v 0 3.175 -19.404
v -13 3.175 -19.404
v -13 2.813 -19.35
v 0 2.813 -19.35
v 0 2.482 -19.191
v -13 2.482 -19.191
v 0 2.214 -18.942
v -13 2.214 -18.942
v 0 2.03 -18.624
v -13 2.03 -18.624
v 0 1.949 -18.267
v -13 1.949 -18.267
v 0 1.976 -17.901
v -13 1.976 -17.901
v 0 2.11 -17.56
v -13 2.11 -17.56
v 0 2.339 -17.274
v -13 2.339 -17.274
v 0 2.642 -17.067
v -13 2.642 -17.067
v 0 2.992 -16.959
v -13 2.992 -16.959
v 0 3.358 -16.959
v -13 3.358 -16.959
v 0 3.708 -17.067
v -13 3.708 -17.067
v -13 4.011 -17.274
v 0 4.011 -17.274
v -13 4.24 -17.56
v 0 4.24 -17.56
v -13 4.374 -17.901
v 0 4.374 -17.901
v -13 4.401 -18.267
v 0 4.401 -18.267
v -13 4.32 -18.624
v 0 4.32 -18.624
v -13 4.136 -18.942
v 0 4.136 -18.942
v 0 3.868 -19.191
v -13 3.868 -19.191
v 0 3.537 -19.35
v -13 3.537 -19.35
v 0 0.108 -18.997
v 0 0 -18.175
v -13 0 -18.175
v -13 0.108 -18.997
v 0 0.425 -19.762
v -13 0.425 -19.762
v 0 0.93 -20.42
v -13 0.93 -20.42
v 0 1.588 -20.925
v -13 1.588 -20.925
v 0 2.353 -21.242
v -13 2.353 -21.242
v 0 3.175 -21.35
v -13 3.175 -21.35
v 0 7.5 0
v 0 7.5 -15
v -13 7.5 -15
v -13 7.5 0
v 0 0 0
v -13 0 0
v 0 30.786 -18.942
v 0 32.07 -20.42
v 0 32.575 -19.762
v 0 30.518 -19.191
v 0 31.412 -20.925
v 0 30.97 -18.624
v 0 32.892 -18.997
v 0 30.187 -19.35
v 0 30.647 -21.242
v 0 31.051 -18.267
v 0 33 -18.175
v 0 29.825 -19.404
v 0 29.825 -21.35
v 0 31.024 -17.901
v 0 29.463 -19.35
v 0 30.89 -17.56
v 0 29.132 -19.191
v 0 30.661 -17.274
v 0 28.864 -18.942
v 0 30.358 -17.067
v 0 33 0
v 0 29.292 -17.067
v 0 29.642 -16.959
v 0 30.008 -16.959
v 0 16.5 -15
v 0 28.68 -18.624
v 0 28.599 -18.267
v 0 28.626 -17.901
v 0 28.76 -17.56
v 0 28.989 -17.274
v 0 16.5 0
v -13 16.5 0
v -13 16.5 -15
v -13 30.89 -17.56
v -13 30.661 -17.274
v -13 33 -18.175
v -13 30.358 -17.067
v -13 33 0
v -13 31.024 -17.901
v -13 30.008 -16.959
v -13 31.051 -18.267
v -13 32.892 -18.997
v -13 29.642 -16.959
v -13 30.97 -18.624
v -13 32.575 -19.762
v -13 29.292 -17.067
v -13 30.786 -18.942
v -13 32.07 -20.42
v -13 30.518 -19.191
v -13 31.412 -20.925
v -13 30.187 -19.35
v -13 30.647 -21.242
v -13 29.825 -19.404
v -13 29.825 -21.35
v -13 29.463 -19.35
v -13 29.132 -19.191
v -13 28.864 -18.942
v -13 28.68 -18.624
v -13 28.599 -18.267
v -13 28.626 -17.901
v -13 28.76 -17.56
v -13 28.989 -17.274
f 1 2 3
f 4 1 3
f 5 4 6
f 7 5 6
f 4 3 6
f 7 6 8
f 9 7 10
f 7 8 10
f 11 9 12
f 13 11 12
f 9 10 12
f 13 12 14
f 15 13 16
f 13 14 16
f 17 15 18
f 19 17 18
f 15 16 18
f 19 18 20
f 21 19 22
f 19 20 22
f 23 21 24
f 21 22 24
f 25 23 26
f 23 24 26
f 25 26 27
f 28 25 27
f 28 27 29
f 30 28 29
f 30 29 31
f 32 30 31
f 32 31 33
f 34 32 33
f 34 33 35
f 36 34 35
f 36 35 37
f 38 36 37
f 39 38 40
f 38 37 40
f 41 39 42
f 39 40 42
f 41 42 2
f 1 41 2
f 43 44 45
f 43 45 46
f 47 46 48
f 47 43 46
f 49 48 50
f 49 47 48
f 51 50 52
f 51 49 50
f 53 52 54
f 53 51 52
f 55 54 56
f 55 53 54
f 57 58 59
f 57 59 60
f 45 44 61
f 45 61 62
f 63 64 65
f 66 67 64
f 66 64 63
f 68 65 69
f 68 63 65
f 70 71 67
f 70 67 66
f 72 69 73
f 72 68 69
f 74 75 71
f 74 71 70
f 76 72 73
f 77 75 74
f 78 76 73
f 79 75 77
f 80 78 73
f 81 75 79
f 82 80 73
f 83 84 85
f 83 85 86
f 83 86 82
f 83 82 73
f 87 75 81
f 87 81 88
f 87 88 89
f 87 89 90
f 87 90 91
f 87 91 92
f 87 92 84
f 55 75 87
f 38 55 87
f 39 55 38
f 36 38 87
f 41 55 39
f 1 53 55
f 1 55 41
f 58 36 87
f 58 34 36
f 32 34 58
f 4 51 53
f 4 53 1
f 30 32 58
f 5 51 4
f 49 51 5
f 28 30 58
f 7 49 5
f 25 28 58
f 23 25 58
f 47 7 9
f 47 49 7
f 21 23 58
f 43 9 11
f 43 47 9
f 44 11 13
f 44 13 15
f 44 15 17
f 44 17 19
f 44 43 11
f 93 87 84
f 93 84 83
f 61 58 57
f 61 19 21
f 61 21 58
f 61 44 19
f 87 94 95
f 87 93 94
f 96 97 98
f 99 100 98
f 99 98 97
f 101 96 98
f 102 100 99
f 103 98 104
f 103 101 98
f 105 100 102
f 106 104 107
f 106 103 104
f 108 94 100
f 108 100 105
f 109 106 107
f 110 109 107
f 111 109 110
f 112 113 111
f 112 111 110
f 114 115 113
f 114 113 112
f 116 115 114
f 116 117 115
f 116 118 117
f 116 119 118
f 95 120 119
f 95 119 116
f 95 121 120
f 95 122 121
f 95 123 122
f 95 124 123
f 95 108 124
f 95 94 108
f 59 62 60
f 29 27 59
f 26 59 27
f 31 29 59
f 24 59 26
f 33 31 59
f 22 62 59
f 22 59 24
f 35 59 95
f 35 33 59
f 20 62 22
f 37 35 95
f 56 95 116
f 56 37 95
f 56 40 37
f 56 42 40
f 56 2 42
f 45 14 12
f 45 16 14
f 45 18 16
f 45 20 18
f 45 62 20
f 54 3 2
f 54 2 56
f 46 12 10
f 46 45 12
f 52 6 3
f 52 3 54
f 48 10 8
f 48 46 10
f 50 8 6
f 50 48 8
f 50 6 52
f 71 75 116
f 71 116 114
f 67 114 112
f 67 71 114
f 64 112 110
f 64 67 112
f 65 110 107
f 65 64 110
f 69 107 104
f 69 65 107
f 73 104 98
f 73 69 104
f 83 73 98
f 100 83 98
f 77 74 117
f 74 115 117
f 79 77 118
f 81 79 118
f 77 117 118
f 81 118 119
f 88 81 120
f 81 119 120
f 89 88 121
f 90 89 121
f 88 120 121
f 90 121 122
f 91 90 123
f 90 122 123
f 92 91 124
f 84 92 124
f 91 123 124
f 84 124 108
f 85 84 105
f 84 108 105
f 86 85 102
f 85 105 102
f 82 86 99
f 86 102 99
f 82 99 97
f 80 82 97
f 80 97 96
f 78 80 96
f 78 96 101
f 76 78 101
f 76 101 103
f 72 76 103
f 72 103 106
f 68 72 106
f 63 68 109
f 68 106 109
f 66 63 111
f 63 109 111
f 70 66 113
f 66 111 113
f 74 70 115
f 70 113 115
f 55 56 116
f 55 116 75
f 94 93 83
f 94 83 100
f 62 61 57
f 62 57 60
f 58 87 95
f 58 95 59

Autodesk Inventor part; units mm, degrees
ref_plane "YZ Plane" through (0, 0, 0) normal (1, 0, 0) x (0, 1, 0)
ref_plane "XZ Plane" through (0, 0, 0) normal (0, 1, 0) x (-1, 0, 0)
ref_plane "XY Plane" through (0, 0, 0) normal (0, 0, 1) x (1, 0, 0)
sketch "Base Profile" plane through (0, 0, 0) normal (0, 1, 0) x (-1, 0, 0)
  line L0 (0, 0) -> (13, 0)
  line L1 (13, 0) -> (13, -21.35)
  line L2 (13, -21.35) -> (0, -21.35)
  line L3 (0, -21.35) -> (0, 0)
  dimension "d407" = 13
  dimension "d408" = 21.35
extrude "Extrusion21" add sketch "Base Profile" along normal blind 33
sketch "Front Profile" plane through (0, 0, 0) normal (1, 0, 0) x (0, 0, -1)
  line L0 (0, 0) -> (21.35, 0) projected
  line L1 (21.35, 0) -> (21.35, 33) projected
  line L2 (0, 33) -> (21.35, 33) projected
  line L3 (0, 0) -> (0, 33) projected
  line L4 (0, 0) -> (0, 33) projected
  line L5 (0, 16.5) -> (15, 16.5)
  line L6 (15, 16.5) -> (15, 7.5)
  line L7 (15, 7.5) -> (0, 7.5)
  line L8 (0, 7.5) -> (0, 16.5)
  line L9 (15, 33) -> (15, 0)
  line L10 (21.35, 0) -> (21.35, 33) projected
  line L11 (21.35, 16.5) -> (15, 16.5) construction
  circle A0 centre (18.175, 29.825) radius 3.175
  circle A1 centre (18.175, 3.175) radius 3.175
  point P0 (0, 7.5)
  point P1 (18.175, 16.5)
  dimension "d411" = 6.35
  dimension "d412" = 7.5
  dimension "d413" = 9
extrude "Extrusion22" cut sketch "Front Profile" against normal through all contours L3 L5 L6 L7
hole "Hole27" at (0, 29.825, -18.175) at (0, 3.175, -18.175) direction (-1, 0, 0) diameter 2.459 end through all thread size "M3x0.5" class "6H" standard "ANSI Metric M Profile"
fillet "Fillet4" radius 3.175 2 edges at (-6.5, 33, -21.35) (-6.5, 0, -21.35)
equation "\"extrusionWidth\" = 15"
equation "\"bearingOffsetFromBottom\" = 7.5"
equation "\"extrusionOffset\" = 33"
equation "\"bearingStackHeight\" = 9"
equation "\"bearingSlotLength\" = 5"
equation "\"bearingClearance\" = 13"
properties part number "A Idler" material "Aluminum 6061"
